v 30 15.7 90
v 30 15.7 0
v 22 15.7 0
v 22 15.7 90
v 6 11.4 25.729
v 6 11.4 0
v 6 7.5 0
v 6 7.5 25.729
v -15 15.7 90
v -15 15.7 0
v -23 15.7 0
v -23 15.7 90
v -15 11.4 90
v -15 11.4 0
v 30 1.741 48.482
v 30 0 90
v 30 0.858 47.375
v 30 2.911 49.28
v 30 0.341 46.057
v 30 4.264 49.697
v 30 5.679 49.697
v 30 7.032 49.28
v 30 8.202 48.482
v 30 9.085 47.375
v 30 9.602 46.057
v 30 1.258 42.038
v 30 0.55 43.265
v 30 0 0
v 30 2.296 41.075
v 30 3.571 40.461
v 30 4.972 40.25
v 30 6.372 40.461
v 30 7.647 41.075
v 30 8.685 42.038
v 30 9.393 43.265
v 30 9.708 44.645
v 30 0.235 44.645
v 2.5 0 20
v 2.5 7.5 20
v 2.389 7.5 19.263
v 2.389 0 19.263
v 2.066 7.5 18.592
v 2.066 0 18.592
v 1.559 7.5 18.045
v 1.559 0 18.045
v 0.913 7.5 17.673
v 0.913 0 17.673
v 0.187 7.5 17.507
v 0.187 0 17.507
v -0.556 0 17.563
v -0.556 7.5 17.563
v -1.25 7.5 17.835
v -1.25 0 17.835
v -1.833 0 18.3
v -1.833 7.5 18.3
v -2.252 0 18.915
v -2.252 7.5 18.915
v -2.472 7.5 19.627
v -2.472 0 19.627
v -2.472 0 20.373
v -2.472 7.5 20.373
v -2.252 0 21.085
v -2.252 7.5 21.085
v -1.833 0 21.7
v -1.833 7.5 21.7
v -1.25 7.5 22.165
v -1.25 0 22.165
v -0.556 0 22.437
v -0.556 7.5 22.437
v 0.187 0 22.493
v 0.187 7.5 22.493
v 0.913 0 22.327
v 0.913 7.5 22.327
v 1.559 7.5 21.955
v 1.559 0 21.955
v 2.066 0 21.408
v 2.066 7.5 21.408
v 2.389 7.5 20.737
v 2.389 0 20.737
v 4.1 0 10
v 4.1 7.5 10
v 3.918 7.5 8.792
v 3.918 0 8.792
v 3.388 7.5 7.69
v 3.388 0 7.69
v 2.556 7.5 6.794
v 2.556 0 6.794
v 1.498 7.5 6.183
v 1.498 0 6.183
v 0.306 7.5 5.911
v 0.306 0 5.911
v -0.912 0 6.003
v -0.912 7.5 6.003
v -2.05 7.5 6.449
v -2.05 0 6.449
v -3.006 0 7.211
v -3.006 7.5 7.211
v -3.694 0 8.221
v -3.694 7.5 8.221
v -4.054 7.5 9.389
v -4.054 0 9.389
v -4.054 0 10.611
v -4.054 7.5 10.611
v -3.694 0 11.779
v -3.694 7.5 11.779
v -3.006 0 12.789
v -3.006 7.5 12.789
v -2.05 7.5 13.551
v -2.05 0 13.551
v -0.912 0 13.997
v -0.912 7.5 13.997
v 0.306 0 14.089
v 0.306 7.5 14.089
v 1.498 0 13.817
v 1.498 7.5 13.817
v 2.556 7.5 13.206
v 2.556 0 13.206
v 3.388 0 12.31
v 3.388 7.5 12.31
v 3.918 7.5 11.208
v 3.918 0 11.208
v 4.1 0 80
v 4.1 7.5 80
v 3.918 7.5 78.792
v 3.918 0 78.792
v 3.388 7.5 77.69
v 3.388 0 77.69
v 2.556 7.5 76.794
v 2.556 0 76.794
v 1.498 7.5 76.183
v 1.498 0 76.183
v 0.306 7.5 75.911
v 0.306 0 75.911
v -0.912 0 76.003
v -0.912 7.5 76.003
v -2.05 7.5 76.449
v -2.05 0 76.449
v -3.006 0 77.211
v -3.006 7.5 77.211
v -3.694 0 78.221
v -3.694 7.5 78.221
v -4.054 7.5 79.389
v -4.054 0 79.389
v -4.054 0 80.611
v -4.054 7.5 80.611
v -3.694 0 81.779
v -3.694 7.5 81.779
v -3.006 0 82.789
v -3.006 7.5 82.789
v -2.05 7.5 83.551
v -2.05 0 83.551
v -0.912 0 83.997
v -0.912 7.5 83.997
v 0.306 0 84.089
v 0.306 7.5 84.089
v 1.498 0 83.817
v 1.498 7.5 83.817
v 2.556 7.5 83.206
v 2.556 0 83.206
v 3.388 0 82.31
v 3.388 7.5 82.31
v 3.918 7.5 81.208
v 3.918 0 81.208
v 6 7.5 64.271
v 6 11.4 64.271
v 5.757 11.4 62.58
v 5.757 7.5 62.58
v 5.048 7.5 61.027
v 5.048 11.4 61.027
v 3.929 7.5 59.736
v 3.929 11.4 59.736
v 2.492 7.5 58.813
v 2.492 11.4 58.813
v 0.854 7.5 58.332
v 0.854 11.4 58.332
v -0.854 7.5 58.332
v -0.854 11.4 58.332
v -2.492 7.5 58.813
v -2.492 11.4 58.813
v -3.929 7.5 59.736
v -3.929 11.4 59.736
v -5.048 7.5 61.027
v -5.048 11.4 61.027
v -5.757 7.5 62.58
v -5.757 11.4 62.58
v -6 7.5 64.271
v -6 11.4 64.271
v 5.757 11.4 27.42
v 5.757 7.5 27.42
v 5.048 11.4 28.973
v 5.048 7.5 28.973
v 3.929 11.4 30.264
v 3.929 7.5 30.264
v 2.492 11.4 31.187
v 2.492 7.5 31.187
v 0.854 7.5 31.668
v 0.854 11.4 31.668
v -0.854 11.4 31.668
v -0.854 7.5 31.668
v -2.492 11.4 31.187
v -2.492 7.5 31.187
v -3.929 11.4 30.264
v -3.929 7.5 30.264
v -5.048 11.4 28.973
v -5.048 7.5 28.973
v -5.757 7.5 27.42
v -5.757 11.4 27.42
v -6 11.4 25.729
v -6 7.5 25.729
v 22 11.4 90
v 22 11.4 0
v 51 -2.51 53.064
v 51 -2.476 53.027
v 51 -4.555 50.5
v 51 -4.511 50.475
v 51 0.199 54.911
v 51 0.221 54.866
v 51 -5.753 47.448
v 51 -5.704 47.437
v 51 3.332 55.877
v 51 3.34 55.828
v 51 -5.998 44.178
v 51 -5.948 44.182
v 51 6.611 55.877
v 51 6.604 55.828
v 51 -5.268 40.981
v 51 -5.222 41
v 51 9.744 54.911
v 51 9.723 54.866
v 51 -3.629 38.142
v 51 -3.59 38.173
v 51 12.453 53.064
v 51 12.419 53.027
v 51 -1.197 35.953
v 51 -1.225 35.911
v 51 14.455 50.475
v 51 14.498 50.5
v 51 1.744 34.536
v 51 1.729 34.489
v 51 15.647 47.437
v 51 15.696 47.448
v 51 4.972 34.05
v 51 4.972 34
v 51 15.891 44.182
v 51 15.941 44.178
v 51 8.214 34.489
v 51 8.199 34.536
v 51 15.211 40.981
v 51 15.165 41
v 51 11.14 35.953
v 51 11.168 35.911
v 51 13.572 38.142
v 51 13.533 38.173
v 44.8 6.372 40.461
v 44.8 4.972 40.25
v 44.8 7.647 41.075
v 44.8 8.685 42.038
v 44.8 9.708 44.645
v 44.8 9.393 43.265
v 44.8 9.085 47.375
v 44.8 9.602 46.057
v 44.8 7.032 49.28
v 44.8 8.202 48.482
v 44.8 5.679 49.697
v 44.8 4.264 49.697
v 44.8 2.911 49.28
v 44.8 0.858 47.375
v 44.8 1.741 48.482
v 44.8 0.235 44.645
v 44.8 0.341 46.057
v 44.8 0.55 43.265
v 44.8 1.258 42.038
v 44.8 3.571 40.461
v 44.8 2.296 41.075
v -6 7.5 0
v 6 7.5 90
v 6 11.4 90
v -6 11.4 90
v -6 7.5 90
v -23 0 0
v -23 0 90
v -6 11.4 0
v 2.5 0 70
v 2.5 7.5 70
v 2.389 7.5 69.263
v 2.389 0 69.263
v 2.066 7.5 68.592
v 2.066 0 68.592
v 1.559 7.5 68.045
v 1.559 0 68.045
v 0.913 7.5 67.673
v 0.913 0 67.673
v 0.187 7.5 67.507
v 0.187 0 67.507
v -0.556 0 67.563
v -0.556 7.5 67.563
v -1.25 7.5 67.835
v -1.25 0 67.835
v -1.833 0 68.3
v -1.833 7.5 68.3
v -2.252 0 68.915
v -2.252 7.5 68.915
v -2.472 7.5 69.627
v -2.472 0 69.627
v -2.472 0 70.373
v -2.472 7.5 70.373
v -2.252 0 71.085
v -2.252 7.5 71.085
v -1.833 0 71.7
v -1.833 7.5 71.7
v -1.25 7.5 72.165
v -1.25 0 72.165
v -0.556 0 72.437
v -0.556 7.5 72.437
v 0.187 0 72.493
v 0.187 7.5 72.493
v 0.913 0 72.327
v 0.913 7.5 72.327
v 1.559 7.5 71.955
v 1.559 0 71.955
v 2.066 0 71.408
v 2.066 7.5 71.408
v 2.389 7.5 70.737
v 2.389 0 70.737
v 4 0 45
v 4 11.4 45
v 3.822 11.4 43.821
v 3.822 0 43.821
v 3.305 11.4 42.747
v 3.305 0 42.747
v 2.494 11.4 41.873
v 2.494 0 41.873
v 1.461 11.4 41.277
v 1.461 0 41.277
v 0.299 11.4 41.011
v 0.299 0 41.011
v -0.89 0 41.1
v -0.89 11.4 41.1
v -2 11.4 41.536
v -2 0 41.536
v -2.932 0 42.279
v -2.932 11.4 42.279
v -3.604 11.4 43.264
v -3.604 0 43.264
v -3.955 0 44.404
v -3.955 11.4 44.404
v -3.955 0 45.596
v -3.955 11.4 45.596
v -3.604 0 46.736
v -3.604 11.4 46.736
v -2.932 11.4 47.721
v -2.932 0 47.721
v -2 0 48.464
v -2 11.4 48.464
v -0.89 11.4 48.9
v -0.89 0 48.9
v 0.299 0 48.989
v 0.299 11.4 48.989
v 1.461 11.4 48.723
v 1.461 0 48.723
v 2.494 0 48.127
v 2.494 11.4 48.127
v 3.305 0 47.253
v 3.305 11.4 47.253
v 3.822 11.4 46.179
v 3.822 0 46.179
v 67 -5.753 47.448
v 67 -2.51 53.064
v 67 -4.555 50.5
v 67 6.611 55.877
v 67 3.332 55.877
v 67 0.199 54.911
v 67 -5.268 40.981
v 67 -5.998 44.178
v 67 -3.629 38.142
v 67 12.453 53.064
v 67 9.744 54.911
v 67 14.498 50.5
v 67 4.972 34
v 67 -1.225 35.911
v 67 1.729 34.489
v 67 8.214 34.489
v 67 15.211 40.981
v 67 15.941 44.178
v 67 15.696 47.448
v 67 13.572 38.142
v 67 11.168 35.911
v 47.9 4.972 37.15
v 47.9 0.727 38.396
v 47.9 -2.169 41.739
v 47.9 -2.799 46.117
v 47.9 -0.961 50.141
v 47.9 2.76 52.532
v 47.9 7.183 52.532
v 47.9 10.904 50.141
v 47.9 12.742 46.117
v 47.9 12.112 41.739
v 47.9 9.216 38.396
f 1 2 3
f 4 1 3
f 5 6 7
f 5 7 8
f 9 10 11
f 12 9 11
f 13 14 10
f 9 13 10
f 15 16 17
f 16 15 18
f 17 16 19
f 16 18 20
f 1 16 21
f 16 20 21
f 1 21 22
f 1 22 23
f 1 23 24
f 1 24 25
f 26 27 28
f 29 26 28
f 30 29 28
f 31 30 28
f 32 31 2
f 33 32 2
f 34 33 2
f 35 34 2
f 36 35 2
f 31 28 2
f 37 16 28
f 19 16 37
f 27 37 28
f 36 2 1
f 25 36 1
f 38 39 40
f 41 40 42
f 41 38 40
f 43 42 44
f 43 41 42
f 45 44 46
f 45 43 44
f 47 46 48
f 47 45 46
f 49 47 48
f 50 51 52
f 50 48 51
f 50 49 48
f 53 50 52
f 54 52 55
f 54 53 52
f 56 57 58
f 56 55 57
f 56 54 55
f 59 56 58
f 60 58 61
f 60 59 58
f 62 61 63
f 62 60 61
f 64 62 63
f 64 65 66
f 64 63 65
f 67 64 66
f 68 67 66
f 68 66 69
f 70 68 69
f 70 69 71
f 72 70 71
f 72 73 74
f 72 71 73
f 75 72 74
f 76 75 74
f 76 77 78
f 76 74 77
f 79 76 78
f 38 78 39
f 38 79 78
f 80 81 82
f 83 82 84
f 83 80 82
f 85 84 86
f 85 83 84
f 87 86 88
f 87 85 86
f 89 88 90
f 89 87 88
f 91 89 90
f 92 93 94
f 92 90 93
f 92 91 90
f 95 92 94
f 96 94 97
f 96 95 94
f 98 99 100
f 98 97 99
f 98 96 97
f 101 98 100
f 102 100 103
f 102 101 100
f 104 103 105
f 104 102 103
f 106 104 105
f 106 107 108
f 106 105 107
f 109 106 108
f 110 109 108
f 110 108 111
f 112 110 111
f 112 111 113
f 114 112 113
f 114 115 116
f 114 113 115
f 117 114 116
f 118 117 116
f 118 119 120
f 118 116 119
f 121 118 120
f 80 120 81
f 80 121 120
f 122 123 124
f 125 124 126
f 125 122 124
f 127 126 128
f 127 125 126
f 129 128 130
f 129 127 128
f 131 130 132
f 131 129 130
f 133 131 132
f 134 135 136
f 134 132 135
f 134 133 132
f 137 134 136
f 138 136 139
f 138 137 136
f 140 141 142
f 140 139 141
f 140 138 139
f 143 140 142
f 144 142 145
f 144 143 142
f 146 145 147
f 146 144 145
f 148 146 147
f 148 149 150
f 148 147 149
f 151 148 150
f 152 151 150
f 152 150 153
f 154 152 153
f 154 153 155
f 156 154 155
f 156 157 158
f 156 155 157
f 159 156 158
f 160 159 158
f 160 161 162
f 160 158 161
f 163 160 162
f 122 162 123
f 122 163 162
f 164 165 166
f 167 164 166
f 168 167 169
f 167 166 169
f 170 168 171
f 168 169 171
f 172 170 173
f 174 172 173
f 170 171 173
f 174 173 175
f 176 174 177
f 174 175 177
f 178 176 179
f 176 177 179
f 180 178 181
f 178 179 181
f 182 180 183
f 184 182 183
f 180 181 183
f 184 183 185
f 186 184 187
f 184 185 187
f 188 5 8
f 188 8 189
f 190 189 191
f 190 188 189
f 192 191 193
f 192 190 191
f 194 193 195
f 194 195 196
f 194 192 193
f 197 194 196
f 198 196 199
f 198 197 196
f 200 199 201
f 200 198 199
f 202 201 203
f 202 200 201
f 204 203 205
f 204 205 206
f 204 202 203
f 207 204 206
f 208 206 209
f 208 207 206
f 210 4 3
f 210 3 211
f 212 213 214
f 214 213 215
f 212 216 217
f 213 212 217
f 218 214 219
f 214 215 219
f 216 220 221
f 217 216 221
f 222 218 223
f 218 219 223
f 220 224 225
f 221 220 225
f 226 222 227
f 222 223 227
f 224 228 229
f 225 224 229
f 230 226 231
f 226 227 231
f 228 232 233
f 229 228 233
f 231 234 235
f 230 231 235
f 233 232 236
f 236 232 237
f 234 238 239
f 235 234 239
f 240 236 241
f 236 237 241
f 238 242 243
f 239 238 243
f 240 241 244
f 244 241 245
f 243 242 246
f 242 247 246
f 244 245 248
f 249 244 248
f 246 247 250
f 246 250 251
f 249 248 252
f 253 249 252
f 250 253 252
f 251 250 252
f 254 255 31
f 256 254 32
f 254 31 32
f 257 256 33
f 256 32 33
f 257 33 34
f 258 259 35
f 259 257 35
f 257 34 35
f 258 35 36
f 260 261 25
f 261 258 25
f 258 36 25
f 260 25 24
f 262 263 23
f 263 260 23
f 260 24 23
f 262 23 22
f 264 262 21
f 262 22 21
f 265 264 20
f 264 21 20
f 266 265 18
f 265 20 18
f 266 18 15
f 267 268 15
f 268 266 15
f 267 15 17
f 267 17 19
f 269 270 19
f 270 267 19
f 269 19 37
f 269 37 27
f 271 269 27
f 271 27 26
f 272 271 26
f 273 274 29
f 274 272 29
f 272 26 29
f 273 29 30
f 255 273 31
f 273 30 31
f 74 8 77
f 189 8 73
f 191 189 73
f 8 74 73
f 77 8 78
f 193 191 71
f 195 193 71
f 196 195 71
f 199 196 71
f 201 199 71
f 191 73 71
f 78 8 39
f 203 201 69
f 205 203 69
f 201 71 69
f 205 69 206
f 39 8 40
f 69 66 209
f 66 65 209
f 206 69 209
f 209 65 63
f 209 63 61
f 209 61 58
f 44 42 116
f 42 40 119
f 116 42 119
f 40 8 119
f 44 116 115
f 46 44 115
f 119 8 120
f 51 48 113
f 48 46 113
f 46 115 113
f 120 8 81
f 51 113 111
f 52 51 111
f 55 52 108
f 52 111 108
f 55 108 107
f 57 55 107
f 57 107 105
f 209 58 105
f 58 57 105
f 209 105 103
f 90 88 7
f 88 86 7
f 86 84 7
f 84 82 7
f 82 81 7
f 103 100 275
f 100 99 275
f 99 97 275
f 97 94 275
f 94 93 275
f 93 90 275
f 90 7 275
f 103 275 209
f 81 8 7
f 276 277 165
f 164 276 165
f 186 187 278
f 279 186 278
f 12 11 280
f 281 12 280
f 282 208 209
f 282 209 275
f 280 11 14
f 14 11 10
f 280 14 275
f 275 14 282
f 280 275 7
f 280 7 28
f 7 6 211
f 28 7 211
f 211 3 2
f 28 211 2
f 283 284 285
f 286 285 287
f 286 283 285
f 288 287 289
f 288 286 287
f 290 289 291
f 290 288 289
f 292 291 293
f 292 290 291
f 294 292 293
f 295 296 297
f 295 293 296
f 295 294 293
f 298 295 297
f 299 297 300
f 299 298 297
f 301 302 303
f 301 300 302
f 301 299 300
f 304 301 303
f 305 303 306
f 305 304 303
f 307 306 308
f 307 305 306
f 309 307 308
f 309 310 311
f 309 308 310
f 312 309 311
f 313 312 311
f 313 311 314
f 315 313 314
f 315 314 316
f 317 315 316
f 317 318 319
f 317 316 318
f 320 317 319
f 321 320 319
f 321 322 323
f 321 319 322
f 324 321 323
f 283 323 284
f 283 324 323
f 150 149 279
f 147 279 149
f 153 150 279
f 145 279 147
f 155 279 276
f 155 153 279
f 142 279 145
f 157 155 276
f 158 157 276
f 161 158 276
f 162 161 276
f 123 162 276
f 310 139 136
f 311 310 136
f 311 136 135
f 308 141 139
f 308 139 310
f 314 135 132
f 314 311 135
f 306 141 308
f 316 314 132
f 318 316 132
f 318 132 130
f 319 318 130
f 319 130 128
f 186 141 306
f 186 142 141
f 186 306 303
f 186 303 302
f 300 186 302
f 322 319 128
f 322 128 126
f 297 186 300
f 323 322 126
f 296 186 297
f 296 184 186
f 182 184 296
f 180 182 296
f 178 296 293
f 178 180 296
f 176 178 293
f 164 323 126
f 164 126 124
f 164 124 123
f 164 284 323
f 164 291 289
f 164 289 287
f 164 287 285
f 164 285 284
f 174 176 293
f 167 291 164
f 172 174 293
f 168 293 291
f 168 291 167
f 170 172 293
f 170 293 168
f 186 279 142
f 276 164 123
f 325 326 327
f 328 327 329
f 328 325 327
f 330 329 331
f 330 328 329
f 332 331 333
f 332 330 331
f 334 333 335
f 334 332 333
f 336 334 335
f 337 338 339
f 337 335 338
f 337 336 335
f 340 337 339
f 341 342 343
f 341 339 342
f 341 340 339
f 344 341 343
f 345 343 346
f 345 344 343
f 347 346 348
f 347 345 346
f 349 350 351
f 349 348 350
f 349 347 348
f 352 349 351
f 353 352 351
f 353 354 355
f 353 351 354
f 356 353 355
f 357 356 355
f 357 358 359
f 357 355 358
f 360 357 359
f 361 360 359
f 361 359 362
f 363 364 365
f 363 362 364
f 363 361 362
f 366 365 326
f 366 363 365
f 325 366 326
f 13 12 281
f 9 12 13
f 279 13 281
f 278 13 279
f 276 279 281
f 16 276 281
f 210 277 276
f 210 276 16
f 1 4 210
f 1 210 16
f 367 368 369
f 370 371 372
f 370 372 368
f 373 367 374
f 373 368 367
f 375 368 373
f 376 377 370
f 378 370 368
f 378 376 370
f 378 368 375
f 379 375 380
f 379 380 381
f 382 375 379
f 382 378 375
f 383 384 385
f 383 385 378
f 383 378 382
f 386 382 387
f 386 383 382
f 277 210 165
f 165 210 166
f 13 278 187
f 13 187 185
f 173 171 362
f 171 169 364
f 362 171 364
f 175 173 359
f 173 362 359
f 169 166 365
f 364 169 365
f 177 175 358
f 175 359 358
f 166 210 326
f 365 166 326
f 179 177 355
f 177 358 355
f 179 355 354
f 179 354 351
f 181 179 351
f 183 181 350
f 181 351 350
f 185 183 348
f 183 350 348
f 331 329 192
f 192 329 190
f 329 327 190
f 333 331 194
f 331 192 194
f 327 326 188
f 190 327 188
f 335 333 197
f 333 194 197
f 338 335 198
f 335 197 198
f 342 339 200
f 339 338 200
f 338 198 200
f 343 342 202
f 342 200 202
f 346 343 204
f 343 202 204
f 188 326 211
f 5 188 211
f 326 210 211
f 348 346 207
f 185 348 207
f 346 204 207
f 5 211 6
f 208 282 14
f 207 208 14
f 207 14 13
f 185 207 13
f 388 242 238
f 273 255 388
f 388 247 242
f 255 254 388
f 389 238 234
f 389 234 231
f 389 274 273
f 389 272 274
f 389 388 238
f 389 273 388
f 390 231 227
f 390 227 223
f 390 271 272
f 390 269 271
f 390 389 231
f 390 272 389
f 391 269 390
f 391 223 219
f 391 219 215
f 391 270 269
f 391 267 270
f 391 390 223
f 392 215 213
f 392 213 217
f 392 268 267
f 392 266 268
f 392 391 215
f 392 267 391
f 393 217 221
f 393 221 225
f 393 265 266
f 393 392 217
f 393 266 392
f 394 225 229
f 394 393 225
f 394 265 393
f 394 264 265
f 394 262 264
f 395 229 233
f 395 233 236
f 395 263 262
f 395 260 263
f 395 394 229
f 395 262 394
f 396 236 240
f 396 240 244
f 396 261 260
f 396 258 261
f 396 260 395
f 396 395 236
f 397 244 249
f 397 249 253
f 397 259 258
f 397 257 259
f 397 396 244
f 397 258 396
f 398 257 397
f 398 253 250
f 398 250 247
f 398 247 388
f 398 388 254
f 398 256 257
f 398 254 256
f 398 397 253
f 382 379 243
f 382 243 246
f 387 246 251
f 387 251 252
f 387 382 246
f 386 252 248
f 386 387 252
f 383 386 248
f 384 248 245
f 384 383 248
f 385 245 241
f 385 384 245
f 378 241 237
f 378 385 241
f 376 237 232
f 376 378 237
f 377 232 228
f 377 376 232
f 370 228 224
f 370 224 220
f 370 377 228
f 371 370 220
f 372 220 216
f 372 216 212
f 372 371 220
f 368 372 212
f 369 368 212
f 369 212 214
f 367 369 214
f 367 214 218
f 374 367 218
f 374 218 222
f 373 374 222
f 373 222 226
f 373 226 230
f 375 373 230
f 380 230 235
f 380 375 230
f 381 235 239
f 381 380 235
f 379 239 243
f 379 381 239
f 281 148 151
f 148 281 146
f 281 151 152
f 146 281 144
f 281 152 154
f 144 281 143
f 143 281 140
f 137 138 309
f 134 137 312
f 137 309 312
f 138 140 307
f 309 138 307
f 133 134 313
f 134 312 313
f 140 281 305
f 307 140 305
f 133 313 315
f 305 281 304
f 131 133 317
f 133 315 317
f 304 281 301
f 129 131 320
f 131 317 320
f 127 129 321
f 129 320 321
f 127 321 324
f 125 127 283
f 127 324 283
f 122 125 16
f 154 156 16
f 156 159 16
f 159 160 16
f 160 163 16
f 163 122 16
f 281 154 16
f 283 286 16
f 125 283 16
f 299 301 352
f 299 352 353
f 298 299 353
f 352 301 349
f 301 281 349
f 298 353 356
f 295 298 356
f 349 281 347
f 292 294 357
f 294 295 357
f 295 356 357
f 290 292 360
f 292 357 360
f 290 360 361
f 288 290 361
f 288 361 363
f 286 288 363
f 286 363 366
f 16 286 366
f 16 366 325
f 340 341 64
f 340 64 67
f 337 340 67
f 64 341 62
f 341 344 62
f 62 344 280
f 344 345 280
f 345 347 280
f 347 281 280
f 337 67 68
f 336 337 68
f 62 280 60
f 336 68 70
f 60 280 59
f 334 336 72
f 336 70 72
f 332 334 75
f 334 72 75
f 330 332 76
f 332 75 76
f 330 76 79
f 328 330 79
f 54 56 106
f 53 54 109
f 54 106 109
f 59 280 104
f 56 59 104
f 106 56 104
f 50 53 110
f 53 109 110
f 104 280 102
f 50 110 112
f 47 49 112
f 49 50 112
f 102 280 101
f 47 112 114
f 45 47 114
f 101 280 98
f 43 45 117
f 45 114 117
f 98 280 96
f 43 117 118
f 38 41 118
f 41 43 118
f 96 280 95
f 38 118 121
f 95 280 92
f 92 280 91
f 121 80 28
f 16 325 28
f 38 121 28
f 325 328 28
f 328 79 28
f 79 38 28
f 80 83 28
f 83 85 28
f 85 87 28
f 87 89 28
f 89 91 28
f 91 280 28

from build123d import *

# Parameters (mm, degrees)
BOSS_EXTRUDE1_DEPTH = 90
SKETCH2_R           = 4.75
BOSS_EXTRUDE2_DEPTH = 37
SKETCH3_R           = 11
BOSS_EXTRUDE3_DEPTH = 16
CHAMFER1_SIZE       = 6.2
SKETCH4_R           = 4
SKETCH4_R_2         = 2.5
SKETCH4_R_3         = 4.1
CUT_EXTRUDE1_DEPTH  = 16.97152885
CUT_EXTRUDE2_DEPTH  = 3.9


with BuildPart() as part:
    # Sketch1 → Boss-Extrude1 (new body)
    with BuildSketch(Plane.XY):
        Polygon((0, 0), (30, 0), (30, 15.7), (22, 15.7), (22, 11.4), (0, 11.4), (-15, 11.4), (-15, 15.7), (-23, 15.7), (-23, 0), align=None)
    extrude(amount=BOSS_EXTRUDE1_DEPTH)

    # Sketch2 → Boss-Extrude2 (add)
    with BuildSketch(Plane(origin=(30, 0, 0), x_dir=(0, 0, -1), z_dir=(1, 0, 0))):
        with Locations((-45, 4.97152885)):
            Circle(SKETCH2_R)
    extrude(amount=BOSS_EXTRUDE2_DEPTH)

    # Sketch3 → Boss-Extrude3 (add)
    with BuildSketch(Plane(origin=(67, 0, 0), x_dir=(0, 0, -1), z_dir=(1, 0, 0))):
        with Locations((-45, 4.97152885)):
            Circle(SKETCH3_R)
    extrude(amount=-BOSS_EXTRUDE3_DEPTH)

    # Chamfer1
    chamfer1_edges = [part.edges().sort_by_distance(p)[0] for p in [
        (51, 4.97152885, 49.75),
    ]]
    chamfer(chamfer1_edges, length=CHAMFER1_SIZE)

    # Sketch4 → Cut-Extrude1 (cut, through all)
    with BuildSketch(Plane(origin=(0, 0, 0), x_dir=(1, 0, 0), z_dir=(0, 1, 0))):
        with Locations((0, -45)):
            Circle(SKETCH4_R)
        with Locations((0, -20)):
            Circle(SKETCH4_R_2)
        with Locations((0, -70)):
            Circle(SKETCH4_R_2)
        with Locations((0, -10)):
            Circle(SKETCH4_R_3)
        with Locations((0, -80)):
            Circle(SKETCH4_R_3)
    extrude(amount=CUT_EXTRUDE1_DEPTH, mode=Mode.SUBTRACT)

    # Sketch5 → Cut-Extrude2 (cut)
    with BuildSketch(Plane(origin=(0, 11.4, 0), x_dir=(1, 0, 0), z_dir=(0, 1, 0))):
        with BuildLine():
            Line((-6, -25.72942469), (-6, 7.985784124))
            ThreePointArc((-6, 7.985784124), (0, 13.985784124), (6, 7.985784124))
            Line((6, 7.985784124), (6, -25.72942469))
            ThreePointArc((6, -25.72942469), (0, -31.72942469), (-6, -25.72942469))
        make_face()
        with BuildLine():
            Line((-6, -64.27057531), (-6, -97.985784124))
            ThreePointArc((-6, -97.985784124), (0, -103.985784124), (6, -97.985784124))
            Line((6, -97.985784124), (6, -64.27057531))
            ThreePointArc((6, -64.27057531), (0, -58.27057531), (-6, -64.27057531))
        make_face()
    extrude(amount=-CUT_EXTRUDE2_DEPTH, mode=Mode.SUBTRACT)


solid = part.part
